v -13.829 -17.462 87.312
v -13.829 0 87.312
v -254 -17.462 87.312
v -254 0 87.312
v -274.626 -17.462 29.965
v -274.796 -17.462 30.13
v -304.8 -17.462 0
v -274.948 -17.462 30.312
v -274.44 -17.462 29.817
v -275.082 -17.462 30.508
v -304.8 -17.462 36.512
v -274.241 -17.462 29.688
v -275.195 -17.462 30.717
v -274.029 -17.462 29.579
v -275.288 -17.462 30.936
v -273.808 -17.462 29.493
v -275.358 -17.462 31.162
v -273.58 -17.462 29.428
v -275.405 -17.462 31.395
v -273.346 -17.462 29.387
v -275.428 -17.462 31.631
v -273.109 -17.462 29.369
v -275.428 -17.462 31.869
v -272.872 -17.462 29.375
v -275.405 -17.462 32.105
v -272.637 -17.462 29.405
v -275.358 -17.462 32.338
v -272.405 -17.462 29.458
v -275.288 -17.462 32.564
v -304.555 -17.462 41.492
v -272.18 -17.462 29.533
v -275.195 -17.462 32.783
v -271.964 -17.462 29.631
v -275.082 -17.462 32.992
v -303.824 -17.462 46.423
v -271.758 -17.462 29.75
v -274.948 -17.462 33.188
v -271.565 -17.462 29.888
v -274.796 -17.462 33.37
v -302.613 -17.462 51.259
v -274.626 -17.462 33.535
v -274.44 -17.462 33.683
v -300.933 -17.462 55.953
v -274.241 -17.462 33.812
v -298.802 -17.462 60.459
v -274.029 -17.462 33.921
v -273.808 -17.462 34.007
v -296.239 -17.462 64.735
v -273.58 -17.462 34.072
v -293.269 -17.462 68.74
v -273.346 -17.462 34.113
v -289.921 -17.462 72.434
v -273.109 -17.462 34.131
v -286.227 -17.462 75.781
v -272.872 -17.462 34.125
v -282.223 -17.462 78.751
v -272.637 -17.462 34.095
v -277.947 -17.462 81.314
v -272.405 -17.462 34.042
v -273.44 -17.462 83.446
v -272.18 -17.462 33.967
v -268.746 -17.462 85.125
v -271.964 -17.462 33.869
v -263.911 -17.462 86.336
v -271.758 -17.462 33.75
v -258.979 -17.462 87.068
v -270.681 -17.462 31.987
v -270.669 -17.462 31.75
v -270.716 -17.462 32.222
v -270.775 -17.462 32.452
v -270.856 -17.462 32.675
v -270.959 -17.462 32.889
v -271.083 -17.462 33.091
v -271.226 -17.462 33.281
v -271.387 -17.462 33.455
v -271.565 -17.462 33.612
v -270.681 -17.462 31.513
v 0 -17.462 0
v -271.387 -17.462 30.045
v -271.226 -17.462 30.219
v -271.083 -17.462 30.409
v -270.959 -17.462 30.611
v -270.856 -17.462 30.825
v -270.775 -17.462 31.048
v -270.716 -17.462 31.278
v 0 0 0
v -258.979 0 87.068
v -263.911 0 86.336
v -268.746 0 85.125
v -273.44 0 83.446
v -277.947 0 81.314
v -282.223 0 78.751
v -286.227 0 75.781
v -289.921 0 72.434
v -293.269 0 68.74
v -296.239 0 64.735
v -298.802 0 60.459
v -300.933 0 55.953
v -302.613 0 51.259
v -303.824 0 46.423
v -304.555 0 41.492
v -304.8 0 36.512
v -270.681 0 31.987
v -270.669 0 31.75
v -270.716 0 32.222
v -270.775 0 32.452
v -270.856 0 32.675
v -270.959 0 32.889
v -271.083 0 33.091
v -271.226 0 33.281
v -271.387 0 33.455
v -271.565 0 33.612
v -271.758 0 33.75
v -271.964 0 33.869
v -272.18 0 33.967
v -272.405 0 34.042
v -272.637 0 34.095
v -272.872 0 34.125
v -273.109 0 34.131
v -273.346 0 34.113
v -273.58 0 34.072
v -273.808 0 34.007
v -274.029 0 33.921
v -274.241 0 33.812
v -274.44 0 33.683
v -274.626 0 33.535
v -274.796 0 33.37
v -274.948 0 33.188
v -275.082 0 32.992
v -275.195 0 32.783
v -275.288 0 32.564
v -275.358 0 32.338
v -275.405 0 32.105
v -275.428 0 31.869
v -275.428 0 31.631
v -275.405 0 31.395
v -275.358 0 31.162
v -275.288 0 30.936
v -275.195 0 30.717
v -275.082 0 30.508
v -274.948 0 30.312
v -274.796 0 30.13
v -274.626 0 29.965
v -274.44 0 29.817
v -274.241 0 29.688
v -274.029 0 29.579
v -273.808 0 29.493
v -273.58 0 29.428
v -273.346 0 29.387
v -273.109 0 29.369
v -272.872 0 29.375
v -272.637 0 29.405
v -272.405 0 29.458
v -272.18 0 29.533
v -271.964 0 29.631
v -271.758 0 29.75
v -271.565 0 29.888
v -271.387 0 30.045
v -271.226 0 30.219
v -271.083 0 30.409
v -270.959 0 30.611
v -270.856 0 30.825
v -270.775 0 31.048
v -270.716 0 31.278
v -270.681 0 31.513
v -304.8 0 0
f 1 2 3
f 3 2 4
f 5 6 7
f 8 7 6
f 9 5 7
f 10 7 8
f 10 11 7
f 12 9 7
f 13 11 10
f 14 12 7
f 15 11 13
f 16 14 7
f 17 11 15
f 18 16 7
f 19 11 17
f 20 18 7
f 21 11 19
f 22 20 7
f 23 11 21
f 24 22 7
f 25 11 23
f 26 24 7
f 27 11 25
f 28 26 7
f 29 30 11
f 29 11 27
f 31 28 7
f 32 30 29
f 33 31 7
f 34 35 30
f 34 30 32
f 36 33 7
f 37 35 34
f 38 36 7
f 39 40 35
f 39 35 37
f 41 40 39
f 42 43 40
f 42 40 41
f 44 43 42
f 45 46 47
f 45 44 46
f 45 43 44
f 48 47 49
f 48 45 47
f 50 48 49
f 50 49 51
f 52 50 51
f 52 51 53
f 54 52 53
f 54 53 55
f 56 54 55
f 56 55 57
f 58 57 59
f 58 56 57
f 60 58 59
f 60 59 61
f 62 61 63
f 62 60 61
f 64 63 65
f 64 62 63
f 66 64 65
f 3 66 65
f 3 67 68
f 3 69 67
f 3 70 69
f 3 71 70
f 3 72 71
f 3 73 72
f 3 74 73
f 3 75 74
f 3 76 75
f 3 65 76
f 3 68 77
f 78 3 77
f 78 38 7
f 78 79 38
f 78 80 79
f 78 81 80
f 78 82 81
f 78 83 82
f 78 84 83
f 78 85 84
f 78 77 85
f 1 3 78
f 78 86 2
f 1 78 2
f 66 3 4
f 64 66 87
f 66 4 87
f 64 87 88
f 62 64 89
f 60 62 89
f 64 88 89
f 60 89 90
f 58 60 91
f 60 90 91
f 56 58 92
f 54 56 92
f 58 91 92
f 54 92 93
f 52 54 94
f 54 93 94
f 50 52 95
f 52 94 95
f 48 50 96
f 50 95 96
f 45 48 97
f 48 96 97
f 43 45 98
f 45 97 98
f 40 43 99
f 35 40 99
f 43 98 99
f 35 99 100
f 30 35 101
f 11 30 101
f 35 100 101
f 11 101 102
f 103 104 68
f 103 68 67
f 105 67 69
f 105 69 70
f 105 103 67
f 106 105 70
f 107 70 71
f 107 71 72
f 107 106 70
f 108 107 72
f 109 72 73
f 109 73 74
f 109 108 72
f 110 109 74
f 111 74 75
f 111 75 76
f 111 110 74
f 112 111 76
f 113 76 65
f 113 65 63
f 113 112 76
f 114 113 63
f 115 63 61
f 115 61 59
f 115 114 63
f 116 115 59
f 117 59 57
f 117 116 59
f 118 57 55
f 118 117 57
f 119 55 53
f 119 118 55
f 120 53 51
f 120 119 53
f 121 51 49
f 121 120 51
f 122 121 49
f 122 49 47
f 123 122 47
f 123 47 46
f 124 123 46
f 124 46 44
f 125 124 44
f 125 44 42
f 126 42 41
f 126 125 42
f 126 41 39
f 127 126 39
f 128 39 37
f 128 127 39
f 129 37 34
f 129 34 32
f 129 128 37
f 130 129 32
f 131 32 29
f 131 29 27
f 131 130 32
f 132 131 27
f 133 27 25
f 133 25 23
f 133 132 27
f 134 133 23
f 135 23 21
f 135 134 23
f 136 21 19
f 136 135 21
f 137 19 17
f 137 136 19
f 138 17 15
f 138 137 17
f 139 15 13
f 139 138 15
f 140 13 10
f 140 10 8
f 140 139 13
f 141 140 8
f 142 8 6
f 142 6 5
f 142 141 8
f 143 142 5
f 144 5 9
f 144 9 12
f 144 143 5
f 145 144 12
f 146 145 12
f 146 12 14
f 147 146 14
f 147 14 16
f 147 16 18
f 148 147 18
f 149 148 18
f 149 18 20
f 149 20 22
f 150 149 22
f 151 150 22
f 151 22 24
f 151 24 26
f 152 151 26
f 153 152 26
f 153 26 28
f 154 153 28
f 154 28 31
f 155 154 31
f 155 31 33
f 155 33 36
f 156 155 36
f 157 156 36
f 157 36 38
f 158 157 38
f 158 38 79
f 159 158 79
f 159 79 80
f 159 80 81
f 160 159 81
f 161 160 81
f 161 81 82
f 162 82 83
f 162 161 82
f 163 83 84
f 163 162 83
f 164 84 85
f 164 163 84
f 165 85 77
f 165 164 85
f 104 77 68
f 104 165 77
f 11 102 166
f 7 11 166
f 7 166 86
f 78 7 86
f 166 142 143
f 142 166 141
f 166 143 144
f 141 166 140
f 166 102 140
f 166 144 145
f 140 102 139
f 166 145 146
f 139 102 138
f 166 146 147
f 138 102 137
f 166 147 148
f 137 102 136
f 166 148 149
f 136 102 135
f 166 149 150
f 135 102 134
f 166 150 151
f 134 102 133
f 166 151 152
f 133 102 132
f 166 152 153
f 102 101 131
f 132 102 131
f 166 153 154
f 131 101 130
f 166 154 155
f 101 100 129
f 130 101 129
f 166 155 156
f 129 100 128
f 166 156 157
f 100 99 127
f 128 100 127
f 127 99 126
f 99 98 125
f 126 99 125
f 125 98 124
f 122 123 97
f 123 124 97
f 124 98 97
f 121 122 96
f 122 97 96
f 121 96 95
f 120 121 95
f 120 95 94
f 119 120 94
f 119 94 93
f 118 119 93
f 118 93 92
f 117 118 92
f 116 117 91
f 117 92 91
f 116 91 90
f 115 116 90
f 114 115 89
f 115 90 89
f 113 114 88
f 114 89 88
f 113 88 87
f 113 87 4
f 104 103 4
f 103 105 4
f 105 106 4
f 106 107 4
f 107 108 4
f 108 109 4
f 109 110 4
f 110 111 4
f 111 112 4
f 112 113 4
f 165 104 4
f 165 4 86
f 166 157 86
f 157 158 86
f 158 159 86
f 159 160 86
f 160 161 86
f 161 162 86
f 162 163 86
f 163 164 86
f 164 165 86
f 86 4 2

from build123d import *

# Parameters (mm, degrees)
F0_R     = 2.38125
F1_DEPTH = 17.4625


with BuildPart() as f1:
    # F0 (on Front) → F1 (new body)
    with BuildSketch(Plane.XZ):
        with BuildLine():
            Line((-304.8, 0), (0, 0))
            Line((0, 0), (-13.828941, 87.3125))
            Line((-13.828941, 87.3125), (-254, 87.3125))
            ThreePointArc((-254, 87.3125), (-289.921024, 72.433524), (-304.8, 36.5125))
            Line((-304.8, 36.5125), (-304.8, 0))
        make_face()
        with Locations((-273.05, 31.75)):
            Circle(F0_R, mode=Mode.SUBTRACT)
    extrude(amount=F1_DEPTH)


solid = f1.part
